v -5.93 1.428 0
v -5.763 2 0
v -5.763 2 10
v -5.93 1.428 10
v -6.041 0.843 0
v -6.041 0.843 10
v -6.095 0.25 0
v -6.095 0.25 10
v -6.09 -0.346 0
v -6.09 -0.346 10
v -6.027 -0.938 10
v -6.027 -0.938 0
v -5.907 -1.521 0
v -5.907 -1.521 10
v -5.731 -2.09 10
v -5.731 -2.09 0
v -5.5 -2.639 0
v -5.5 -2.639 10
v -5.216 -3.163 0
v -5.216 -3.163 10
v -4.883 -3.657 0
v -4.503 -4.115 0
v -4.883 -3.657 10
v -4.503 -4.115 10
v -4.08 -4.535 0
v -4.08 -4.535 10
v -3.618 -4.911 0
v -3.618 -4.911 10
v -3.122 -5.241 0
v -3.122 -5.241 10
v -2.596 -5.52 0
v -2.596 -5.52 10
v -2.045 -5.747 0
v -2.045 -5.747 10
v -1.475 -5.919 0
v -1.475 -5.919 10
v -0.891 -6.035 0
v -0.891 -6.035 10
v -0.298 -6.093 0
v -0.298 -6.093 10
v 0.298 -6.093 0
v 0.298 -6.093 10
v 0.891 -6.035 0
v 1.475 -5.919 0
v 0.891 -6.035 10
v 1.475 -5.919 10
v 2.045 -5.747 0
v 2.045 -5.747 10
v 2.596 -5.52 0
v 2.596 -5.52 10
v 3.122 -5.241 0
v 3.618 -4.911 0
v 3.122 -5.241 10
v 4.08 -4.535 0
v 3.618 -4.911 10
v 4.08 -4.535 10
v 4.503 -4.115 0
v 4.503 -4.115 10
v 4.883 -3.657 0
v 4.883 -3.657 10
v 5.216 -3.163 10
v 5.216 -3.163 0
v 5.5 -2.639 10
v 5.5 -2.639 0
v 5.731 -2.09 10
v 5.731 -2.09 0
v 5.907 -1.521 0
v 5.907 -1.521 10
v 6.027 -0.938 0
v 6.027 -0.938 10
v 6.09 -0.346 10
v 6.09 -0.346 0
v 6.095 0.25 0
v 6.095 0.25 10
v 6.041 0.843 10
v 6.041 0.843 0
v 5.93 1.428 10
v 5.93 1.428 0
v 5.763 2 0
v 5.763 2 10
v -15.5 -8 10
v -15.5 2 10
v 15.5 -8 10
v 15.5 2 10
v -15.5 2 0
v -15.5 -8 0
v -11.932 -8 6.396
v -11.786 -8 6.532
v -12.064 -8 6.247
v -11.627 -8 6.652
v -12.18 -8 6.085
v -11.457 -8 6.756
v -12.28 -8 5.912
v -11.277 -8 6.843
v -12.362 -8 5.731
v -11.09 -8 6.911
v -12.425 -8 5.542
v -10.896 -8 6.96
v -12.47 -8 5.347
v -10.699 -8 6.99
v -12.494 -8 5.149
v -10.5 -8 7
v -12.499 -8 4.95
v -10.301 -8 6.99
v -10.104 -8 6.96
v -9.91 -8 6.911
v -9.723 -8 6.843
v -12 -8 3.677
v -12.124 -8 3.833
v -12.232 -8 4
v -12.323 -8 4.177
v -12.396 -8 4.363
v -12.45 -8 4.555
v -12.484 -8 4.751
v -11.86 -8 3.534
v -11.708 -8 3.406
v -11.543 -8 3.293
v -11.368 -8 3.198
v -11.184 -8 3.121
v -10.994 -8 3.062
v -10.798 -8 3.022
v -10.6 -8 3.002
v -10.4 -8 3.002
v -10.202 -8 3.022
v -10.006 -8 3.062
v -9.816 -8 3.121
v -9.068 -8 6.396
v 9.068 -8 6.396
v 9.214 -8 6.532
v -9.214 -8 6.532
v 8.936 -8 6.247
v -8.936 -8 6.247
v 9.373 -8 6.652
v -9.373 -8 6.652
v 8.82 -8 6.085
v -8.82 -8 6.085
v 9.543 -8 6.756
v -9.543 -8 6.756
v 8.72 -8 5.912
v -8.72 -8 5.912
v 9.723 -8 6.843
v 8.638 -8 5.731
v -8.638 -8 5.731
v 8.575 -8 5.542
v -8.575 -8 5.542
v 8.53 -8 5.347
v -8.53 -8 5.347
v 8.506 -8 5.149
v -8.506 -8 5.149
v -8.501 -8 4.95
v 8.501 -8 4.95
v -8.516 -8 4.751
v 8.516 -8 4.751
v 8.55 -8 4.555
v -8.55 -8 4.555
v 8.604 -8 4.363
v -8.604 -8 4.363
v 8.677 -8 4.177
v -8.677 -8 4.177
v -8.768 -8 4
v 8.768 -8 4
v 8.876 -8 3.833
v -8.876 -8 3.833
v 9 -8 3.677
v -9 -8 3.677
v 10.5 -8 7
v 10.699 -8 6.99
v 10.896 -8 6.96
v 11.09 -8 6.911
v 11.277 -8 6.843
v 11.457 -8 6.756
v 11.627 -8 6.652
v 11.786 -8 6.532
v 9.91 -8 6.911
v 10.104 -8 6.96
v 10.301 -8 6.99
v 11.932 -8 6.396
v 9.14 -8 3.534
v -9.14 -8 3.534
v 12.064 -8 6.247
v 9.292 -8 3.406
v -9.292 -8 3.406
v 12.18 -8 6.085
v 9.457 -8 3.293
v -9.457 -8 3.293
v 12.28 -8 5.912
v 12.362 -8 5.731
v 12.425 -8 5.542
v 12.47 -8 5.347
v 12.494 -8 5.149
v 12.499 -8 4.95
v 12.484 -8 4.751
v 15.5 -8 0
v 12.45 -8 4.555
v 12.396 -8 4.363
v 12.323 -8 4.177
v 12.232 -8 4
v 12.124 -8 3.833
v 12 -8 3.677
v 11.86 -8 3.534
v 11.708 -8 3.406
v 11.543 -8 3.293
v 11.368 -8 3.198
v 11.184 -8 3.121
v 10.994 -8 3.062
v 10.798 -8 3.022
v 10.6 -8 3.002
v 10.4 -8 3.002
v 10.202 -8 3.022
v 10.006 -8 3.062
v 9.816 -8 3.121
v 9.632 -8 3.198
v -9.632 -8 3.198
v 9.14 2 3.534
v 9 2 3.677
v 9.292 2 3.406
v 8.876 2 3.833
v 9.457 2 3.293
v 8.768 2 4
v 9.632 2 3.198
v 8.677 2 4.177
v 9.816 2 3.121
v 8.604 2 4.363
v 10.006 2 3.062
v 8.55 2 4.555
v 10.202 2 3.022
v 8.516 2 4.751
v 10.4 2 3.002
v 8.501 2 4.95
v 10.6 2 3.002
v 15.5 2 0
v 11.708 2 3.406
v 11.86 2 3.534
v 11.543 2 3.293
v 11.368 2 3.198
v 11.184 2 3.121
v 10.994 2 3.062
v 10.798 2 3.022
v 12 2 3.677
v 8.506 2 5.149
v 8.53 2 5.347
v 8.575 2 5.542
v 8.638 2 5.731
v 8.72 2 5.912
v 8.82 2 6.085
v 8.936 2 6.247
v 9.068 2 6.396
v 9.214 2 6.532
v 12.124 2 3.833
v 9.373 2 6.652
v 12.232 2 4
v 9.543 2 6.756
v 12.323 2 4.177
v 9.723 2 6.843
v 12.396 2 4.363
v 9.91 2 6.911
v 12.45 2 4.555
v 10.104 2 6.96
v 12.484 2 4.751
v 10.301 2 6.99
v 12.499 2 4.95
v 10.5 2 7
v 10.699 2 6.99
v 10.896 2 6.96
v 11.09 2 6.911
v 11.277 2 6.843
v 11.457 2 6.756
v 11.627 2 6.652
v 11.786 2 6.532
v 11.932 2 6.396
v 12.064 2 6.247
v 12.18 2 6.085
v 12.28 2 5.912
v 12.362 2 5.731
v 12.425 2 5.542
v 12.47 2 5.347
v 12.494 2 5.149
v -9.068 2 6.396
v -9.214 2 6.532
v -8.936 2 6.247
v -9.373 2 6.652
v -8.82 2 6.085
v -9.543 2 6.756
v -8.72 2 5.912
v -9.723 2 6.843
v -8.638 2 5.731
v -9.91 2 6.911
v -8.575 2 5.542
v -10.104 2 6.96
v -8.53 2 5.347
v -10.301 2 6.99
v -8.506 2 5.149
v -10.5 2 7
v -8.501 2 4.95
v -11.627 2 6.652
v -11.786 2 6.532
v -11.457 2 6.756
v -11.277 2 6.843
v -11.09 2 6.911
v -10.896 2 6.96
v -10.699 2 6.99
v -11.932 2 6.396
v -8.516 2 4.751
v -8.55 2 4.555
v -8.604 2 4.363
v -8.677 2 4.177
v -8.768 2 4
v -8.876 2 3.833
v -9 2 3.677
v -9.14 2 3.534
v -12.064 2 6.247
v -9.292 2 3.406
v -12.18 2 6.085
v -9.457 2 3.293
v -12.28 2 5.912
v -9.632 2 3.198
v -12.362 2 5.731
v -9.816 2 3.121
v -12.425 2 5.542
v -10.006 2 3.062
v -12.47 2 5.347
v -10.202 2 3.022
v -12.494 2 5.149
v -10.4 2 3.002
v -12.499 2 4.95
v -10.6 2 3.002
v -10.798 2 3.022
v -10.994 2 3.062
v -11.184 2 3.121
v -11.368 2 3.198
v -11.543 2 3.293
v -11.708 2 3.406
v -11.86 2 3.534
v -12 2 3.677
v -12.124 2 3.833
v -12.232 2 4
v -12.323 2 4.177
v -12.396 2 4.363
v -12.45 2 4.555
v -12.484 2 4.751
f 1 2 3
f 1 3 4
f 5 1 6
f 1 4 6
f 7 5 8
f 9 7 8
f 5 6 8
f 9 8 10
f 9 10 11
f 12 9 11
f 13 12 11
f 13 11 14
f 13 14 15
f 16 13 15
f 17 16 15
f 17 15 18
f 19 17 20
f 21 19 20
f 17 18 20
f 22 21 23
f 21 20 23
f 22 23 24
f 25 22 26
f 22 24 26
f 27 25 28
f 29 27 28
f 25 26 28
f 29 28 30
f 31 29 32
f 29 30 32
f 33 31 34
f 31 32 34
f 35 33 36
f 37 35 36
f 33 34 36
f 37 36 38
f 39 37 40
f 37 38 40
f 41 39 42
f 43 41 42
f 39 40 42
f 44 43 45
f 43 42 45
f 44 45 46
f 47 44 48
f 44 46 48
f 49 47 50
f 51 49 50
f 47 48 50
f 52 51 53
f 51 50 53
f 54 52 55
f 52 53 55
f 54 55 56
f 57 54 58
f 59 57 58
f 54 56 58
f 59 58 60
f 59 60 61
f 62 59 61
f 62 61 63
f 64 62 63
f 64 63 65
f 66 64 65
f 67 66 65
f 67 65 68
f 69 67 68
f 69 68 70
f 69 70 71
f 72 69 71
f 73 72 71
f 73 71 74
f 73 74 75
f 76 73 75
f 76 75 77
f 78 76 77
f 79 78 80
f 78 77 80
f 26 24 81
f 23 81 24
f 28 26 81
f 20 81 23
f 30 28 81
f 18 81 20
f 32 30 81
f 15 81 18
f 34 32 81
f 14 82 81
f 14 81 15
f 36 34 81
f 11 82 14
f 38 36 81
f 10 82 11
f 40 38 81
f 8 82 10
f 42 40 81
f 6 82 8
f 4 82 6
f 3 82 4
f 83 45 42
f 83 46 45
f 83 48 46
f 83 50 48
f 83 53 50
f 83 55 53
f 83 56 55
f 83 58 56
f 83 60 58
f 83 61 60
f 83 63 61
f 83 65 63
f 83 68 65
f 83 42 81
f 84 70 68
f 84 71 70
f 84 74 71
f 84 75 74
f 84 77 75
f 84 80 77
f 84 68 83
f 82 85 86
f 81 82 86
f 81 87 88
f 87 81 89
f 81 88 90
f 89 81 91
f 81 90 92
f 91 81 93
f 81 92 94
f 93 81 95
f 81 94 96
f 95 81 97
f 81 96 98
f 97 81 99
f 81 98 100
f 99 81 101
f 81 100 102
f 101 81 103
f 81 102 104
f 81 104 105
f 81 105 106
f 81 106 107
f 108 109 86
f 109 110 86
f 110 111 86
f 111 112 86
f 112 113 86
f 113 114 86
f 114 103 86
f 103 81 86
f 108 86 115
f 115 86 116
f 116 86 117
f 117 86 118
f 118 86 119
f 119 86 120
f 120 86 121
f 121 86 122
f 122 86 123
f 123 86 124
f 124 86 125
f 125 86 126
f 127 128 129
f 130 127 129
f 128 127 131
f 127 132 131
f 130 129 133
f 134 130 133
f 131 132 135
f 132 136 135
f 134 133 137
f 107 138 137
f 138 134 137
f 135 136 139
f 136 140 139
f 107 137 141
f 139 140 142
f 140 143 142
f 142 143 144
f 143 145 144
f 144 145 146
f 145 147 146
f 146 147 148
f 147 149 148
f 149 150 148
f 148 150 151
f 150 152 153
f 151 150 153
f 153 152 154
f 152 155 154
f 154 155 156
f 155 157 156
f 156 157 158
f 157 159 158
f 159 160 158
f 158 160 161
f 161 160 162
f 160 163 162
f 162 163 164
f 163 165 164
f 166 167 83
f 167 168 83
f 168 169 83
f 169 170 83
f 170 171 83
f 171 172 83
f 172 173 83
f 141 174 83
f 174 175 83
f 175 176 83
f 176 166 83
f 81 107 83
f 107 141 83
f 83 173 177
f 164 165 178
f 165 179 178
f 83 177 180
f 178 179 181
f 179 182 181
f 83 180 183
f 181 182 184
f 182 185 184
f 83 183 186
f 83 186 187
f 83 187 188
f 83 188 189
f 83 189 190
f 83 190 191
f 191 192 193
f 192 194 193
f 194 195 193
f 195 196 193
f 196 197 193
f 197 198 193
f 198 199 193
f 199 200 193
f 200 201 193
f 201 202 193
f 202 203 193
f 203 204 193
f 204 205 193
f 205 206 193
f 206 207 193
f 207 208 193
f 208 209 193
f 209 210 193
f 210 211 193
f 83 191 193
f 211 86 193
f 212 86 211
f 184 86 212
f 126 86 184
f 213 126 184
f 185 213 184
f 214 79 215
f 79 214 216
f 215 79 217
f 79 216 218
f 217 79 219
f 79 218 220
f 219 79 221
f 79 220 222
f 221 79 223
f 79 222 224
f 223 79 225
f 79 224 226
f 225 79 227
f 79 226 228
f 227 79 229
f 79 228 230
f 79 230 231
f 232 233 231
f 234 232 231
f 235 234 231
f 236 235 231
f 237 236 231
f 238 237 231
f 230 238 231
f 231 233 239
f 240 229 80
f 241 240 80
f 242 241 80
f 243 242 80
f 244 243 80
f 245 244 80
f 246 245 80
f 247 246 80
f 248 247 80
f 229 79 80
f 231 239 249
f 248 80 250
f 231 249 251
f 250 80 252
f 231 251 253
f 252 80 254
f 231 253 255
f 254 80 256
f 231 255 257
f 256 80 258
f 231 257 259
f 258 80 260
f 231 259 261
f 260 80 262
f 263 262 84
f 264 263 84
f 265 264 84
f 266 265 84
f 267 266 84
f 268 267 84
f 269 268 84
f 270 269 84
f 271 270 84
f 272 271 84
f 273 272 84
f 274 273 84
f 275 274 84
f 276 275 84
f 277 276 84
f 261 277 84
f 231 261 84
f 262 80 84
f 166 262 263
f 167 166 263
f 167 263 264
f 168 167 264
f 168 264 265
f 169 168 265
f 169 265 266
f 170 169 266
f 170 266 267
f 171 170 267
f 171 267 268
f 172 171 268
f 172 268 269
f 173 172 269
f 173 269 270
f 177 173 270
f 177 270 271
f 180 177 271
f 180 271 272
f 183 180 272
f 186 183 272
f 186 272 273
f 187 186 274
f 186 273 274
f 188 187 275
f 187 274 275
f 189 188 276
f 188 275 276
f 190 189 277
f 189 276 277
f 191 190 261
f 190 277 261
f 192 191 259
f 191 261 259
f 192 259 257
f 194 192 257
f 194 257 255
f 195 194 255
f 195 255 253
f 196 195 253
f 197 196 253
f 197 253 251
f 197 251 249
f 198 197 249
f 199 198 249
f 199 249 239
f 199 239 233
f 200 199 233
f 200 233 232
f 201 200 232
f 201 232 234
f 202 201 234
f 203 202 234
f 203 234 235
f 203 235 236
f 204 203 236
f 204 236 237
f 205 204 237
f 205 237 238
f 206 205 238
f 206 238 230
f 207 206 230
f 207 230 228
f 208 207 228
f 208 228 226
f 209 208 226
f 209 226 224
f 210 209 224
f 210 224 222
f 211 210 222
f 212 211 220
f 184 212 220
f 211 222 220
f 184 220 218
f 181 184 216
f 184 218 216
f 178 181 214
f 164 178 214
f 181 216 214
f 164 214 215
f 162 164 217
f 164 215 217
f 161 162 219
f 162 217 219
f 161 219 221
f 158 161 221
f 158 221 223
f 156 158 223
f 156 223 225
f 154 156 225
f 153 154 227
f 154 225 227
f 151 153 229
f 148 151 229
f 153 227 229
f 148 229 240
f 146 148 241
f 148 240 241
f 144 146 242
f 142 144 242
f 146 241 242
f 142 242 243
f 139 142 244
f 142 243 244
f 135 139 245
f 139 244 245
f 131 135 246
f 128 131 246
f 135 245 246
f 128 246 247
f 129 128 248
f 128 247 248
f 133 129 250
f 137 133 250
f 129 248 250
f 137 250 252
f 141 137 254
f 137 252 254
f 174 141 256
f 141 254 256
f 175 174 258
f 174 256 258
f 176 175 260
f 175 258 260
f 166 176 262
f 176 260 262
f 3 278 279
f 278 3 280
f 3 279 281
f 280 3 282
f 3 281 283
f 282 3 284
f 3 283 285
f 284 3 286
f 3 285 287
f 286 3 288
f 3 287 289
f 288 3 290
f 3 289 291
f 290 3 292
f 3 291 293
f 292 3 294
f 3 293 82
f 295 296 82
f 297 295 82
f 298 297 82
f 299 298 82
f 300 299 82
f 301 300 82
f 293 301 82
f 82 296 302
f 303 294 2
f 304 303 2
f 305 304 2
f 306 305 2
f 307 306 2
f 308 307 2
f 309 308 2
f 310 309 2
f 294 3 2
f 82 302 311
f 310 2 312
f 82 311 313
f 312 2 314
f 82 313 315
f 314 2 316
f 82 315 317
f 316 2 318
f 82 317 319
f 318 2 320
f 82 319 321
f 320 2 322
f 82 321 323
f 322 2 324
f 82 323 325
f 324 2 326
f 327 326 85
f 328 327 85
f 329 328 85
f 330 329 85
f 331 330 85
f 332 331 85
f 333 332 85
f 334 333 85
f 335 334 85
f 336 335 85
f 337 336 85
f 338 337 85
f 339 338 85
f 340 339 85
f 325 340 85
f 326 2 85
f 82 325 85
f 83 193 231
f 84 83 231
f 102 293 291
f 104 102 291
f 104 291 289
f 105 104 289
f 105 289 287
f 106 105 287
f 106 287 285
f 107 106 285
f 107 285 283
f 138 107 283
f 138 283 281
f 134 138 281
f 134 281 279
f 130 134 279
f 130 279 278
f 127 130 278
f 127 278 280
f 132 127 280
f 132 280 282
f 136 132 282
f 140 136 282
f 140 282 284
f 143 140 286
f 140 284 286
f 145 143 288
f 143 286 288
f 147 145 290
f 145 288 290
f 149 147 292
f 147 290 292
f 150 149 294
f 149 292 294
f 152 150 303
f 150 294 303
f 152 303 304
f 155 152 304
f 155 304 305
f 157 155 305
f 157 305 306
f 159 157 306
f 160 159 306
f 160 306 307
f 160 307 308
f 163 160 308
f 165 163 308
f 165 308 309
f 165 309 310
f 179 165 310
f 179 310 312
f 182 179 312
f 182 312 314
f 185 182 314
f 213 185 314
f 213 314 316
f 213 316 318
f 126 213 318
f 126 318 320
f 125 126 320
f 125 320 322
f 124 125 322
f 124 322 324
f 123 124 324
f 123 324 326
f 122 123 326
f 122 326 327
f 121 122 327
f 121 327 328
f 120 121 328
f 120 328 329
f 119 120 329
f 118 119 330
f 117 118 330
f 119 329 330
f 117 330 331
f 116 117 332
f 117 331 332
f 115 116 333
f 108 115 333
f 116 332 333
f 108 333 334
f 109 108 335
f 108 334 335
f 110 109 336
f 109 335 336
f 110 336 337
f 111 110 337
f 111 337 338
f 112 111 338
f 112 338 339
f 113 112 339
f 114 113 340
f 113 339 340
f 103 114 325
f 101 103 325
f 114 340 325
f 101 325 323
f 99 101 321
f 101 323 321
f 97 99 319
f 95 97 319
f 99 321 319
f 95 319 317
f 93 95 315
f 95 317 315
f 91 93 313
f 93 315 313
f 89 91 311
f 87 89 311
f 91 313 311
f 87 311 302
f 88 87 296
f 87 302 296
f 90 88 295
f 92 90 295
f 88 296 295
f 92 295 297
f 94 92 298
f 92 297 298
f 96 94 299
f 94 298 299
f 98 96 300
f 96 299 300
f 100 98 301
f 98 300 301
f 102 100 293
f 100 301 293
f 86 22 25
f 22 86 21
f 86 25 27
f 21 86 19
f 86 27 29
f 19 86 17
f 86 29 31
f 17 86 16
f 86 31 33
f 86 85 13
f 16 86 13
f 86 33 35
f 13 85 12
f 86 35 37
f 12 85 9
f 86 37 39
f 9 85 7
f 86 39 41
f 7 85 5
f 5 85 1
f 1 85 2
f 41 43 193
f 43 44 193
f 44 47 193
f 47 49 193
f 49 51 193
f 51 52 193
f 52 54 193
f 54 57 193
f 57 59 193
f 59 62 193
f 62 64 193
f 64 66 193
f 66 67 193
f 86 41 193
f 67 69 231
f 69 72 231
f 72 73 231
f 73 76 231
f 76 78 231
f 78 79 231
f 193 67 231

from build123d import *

# Parameters (mm, degrees)
SKETCH_1_R          = 15
EXTRUDE_1_DEPTH     = 10
CUT_EXTRUDE_1_DEPTH = 10
SKETCH_5_R          = 2
CUT_EXTRUDE_2_DEPTH = 25.779023387
SKETCH_7_W          = 30.648506912
SKETCH_7_H          = 10.688803122
CUT_EXTRUDE_4_DEPTH = 24.45207897
EXTRUDE_START       = -10
EXTRUDE_2_DEPTH     = 10


with BuildPart() as part:
    # ｽｹｯﾁ1 → ﾎﾞｽ - 押し出し1 (new body)
    with BuildSketch(Plane.XY):
        Circle(SKETCH_1_R)
    extrude(amount=EXTRUDE_1_DEPTH)

    # ｽｹｯﾁ2 → ｶｯﾄ - 押し出し1 (cut)
    with BuildSketch(Plane.XY.offset(10)):
        with BuildLine():
            Line((5.762811814, 2), (20.145888179, 2))
            Line((20.145888179, 2), (20.145888179, 26.748934653))
            Line((20.145888179, 26.748934653), (-19.854111821, 26.748934653))
            Line((-19.854111821, 26.748934653), (-19.854111821, 2))
            Line((-19.854111821, 2), (-5.762811814, 2))
            ThreePointArc((-5.762811814, 2), (0, -6.1), (5.762811814, 2))
        make_face()
    extrude(amount=-CUT_EXTRUDE_1_DEPTH, mode=Mode.SUBTRACT)

    # ｽｹｯﾁ5 → ｶｯﾄ - 押し出し2 (cut, through all)
    with BuildSketch(Plane(origin=(0, 2, 0), x_dir=(1, 0, 0), z_dir=(0, 1, 0))):
        with Locations(Location((-10.5, -5, 0), (0, 0, 270))):
            Circle(SKETCH_5_R)
        with Locations(Location((10.5, -5, 0), (0, 0, 270))):
            Circle(SKETCH_5_R)
    extrude(amount=-CUT_EXTRUDE_2_DEPTH, mode=Mode.SUBTRACT)

    # ｽｹｯﾁ7 → ｶｯﾄ - 押し出し4 (cut, through all)
    with BuildSketch(Plane.XY.offset(10)):
        with Locations((0, -13.344401561)):
            Rectangle(SKETCH_7_W, SKETCH_7_H)
    extrude(amount=-CUT_EXTRUDE_4_DEPTH, mode=Mode.SUBTRACT)

    # ｽｹｯﾁ8 → ﾎﾞｽ - 押し出し2 (add)
    with BuildSketch(Plane.XY.offset(10).offset(EXTRUDE_START)):
        with BuildLine():
            Line((-14.866068747, 2), (-15.5, 2))
            Line((-15.5, 2), (-15.5, -8))
            Line((-15.5, -8), (-12.68857754, -8))
            ThreePointArc((-12.68857754, -8), (-14.656555974, -3.191452176), (-14.866068747, 2))
        make_face()
        with BuildLine():
            ThreePointArc((14.866068747, 2), (14.656555974, -3.191452176), (12.68857754, -8))
            Line((12.68857754, -8), (15.5, -8))
            Line((15.5, -8), (15.5, 2))
            Line((15.5, 2), (14.866068747, 2))
        make_face()
    extrude(amount=EXTRUDE_2_DEPTH)


solid = part.part
